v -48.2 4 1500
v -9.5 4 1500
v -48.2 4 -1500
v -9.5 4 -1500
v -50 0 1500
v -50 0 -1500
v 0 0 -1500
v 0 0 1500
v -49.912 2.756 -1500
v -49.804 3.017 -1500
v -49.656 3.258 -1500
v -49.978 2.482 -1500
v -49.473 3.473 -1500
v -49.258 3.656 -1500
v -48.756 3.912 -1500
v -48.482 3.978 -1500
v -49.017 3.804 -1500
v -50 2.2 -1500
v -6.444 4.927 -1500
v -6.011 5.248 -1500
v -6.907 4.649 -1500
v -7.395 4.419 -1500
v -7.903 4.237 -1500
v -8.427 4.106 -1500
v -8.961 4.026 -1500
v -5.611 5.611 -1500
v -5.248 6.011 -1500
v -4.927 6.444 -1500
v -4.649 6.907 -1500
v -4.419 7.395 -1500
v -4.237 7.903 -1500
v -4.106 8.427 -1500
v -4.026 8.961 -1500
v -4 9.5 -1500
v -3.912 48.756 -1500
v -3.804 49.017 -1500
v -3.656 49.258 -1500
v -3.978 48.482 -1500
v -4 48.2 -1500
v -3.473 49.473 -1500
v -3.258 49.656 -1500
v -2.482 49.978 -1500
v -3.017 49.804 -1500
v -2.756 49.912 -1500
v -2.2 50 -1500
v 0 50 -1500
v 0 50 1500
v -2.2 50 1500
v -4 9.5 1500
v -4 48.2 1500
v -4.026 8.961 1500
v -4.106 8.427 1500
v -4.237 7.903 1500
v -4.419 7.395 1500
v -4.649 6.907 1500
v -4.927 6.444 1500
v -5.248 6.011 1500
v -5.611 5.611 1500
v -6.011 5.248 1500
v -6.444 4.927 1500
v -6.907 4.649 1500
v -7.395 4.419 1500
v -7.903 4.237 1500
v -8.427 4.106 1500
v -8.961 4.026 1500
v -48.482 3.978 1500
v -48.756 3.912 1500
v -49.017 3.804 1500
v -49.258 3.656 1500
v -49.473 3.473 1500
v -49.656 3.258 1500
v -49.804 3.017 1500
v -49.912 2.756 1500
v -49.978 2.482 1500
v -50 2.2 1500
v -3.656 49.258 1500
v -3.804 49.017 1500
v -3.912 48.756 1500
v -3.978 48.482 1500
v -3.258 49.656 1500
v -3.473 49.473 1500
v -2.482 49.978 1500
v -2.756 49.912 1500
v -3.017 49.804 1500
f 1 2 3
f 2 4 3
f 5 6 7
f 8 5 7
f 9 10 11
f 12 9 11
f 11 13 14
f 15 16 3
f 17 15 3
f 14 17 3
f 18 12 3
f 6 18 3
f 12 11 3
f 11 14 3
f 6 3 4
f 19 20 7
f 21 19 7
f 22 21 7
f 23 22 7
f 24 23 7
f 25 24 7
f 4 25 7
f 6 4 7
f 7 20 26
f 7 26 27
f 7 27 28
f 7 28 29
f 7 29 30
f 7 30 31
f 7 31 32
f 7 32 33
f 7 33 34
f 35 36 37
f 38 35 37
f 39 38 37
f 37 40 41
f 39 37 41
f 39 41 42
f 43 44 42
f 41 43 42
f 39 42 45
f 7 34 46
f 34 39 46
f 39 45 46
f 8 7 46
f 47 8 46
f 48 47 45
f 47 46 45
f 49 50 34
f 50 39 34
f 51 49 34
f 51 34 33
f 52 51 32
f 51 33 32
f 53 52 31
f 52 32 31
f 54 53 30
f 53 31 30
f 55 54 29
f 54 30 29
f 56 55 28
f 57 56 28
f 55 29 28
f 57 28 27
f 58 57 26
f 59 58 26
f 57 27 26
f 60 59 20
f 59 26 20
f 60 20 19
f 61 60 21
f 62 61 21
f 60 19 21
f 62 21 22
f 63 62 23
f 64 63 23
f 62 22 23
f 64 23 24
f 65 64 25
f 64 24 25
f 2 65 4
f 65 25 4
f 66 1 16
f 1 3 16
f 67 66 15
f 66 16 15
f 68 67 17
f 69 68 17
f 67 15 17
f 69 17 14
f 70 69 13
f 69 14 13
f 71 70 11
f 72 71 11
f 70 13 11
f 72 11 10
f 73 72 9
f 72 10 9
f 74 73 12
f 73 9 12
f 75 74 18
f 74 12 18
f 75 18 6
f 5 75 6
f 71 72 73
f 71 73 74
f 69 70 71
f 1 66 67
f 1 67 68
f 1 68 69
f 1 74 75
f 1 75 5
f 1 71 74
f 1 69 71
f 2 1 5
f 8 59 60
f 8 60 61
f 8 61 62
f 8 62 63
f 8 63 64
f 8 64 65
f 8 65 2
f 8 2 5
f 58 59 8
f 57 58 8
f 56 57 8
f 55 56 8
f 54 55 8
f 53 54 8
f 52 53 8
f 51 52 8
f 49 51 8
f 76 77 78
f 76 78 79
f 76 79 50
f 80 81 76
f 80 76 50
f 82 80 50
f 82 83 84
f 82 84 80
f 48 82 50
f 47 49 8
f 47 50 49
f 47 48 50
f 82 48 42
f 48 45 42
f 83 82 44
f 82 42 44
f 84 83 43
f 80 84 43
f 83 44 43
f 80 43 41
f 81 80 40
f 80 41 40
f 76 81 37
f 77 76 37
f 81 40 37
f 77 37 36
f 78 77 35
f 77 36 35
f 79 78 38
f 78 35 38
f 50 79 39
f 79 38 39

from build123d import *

# Parameters (mm, degrees)
EXTRUDE_1_DEPTH = 1500


with BuildPart() as part:
    # Эскиз1 → Бобышка-Вытянуть1 (new, symmetric)
    with BuildSketch(Plane(origin=(0, 0, 0), x_dir=(-1, 0, 0), z_dir=(0, 0, -1))):
        with BuildLine():
            Line((0, 0), (0, 50))
            Line((0, 50), (2.2, 50))
            ThreePointArc((2.2, 50), (3.472792206, 49.472792206), (4, 48.2))
            Line((4, 48.2), (4, 9.5))
            ThreePointArc((4, 9.5), (5.610912703, 5.610912703), (9.5, 4))
            Line((9.5, 4), (48.2, 4))
            ThreePointArc((48.2, 4), (49.472792206, 3.472792206), (50, 2.2))
            Line((50, 2.2), (50, 0))
            Line((50, 0), (0, 0))
        make_face()
    extrude(amount=EXTRUDE_1_DEPTH, both=True)


solid = part.part
